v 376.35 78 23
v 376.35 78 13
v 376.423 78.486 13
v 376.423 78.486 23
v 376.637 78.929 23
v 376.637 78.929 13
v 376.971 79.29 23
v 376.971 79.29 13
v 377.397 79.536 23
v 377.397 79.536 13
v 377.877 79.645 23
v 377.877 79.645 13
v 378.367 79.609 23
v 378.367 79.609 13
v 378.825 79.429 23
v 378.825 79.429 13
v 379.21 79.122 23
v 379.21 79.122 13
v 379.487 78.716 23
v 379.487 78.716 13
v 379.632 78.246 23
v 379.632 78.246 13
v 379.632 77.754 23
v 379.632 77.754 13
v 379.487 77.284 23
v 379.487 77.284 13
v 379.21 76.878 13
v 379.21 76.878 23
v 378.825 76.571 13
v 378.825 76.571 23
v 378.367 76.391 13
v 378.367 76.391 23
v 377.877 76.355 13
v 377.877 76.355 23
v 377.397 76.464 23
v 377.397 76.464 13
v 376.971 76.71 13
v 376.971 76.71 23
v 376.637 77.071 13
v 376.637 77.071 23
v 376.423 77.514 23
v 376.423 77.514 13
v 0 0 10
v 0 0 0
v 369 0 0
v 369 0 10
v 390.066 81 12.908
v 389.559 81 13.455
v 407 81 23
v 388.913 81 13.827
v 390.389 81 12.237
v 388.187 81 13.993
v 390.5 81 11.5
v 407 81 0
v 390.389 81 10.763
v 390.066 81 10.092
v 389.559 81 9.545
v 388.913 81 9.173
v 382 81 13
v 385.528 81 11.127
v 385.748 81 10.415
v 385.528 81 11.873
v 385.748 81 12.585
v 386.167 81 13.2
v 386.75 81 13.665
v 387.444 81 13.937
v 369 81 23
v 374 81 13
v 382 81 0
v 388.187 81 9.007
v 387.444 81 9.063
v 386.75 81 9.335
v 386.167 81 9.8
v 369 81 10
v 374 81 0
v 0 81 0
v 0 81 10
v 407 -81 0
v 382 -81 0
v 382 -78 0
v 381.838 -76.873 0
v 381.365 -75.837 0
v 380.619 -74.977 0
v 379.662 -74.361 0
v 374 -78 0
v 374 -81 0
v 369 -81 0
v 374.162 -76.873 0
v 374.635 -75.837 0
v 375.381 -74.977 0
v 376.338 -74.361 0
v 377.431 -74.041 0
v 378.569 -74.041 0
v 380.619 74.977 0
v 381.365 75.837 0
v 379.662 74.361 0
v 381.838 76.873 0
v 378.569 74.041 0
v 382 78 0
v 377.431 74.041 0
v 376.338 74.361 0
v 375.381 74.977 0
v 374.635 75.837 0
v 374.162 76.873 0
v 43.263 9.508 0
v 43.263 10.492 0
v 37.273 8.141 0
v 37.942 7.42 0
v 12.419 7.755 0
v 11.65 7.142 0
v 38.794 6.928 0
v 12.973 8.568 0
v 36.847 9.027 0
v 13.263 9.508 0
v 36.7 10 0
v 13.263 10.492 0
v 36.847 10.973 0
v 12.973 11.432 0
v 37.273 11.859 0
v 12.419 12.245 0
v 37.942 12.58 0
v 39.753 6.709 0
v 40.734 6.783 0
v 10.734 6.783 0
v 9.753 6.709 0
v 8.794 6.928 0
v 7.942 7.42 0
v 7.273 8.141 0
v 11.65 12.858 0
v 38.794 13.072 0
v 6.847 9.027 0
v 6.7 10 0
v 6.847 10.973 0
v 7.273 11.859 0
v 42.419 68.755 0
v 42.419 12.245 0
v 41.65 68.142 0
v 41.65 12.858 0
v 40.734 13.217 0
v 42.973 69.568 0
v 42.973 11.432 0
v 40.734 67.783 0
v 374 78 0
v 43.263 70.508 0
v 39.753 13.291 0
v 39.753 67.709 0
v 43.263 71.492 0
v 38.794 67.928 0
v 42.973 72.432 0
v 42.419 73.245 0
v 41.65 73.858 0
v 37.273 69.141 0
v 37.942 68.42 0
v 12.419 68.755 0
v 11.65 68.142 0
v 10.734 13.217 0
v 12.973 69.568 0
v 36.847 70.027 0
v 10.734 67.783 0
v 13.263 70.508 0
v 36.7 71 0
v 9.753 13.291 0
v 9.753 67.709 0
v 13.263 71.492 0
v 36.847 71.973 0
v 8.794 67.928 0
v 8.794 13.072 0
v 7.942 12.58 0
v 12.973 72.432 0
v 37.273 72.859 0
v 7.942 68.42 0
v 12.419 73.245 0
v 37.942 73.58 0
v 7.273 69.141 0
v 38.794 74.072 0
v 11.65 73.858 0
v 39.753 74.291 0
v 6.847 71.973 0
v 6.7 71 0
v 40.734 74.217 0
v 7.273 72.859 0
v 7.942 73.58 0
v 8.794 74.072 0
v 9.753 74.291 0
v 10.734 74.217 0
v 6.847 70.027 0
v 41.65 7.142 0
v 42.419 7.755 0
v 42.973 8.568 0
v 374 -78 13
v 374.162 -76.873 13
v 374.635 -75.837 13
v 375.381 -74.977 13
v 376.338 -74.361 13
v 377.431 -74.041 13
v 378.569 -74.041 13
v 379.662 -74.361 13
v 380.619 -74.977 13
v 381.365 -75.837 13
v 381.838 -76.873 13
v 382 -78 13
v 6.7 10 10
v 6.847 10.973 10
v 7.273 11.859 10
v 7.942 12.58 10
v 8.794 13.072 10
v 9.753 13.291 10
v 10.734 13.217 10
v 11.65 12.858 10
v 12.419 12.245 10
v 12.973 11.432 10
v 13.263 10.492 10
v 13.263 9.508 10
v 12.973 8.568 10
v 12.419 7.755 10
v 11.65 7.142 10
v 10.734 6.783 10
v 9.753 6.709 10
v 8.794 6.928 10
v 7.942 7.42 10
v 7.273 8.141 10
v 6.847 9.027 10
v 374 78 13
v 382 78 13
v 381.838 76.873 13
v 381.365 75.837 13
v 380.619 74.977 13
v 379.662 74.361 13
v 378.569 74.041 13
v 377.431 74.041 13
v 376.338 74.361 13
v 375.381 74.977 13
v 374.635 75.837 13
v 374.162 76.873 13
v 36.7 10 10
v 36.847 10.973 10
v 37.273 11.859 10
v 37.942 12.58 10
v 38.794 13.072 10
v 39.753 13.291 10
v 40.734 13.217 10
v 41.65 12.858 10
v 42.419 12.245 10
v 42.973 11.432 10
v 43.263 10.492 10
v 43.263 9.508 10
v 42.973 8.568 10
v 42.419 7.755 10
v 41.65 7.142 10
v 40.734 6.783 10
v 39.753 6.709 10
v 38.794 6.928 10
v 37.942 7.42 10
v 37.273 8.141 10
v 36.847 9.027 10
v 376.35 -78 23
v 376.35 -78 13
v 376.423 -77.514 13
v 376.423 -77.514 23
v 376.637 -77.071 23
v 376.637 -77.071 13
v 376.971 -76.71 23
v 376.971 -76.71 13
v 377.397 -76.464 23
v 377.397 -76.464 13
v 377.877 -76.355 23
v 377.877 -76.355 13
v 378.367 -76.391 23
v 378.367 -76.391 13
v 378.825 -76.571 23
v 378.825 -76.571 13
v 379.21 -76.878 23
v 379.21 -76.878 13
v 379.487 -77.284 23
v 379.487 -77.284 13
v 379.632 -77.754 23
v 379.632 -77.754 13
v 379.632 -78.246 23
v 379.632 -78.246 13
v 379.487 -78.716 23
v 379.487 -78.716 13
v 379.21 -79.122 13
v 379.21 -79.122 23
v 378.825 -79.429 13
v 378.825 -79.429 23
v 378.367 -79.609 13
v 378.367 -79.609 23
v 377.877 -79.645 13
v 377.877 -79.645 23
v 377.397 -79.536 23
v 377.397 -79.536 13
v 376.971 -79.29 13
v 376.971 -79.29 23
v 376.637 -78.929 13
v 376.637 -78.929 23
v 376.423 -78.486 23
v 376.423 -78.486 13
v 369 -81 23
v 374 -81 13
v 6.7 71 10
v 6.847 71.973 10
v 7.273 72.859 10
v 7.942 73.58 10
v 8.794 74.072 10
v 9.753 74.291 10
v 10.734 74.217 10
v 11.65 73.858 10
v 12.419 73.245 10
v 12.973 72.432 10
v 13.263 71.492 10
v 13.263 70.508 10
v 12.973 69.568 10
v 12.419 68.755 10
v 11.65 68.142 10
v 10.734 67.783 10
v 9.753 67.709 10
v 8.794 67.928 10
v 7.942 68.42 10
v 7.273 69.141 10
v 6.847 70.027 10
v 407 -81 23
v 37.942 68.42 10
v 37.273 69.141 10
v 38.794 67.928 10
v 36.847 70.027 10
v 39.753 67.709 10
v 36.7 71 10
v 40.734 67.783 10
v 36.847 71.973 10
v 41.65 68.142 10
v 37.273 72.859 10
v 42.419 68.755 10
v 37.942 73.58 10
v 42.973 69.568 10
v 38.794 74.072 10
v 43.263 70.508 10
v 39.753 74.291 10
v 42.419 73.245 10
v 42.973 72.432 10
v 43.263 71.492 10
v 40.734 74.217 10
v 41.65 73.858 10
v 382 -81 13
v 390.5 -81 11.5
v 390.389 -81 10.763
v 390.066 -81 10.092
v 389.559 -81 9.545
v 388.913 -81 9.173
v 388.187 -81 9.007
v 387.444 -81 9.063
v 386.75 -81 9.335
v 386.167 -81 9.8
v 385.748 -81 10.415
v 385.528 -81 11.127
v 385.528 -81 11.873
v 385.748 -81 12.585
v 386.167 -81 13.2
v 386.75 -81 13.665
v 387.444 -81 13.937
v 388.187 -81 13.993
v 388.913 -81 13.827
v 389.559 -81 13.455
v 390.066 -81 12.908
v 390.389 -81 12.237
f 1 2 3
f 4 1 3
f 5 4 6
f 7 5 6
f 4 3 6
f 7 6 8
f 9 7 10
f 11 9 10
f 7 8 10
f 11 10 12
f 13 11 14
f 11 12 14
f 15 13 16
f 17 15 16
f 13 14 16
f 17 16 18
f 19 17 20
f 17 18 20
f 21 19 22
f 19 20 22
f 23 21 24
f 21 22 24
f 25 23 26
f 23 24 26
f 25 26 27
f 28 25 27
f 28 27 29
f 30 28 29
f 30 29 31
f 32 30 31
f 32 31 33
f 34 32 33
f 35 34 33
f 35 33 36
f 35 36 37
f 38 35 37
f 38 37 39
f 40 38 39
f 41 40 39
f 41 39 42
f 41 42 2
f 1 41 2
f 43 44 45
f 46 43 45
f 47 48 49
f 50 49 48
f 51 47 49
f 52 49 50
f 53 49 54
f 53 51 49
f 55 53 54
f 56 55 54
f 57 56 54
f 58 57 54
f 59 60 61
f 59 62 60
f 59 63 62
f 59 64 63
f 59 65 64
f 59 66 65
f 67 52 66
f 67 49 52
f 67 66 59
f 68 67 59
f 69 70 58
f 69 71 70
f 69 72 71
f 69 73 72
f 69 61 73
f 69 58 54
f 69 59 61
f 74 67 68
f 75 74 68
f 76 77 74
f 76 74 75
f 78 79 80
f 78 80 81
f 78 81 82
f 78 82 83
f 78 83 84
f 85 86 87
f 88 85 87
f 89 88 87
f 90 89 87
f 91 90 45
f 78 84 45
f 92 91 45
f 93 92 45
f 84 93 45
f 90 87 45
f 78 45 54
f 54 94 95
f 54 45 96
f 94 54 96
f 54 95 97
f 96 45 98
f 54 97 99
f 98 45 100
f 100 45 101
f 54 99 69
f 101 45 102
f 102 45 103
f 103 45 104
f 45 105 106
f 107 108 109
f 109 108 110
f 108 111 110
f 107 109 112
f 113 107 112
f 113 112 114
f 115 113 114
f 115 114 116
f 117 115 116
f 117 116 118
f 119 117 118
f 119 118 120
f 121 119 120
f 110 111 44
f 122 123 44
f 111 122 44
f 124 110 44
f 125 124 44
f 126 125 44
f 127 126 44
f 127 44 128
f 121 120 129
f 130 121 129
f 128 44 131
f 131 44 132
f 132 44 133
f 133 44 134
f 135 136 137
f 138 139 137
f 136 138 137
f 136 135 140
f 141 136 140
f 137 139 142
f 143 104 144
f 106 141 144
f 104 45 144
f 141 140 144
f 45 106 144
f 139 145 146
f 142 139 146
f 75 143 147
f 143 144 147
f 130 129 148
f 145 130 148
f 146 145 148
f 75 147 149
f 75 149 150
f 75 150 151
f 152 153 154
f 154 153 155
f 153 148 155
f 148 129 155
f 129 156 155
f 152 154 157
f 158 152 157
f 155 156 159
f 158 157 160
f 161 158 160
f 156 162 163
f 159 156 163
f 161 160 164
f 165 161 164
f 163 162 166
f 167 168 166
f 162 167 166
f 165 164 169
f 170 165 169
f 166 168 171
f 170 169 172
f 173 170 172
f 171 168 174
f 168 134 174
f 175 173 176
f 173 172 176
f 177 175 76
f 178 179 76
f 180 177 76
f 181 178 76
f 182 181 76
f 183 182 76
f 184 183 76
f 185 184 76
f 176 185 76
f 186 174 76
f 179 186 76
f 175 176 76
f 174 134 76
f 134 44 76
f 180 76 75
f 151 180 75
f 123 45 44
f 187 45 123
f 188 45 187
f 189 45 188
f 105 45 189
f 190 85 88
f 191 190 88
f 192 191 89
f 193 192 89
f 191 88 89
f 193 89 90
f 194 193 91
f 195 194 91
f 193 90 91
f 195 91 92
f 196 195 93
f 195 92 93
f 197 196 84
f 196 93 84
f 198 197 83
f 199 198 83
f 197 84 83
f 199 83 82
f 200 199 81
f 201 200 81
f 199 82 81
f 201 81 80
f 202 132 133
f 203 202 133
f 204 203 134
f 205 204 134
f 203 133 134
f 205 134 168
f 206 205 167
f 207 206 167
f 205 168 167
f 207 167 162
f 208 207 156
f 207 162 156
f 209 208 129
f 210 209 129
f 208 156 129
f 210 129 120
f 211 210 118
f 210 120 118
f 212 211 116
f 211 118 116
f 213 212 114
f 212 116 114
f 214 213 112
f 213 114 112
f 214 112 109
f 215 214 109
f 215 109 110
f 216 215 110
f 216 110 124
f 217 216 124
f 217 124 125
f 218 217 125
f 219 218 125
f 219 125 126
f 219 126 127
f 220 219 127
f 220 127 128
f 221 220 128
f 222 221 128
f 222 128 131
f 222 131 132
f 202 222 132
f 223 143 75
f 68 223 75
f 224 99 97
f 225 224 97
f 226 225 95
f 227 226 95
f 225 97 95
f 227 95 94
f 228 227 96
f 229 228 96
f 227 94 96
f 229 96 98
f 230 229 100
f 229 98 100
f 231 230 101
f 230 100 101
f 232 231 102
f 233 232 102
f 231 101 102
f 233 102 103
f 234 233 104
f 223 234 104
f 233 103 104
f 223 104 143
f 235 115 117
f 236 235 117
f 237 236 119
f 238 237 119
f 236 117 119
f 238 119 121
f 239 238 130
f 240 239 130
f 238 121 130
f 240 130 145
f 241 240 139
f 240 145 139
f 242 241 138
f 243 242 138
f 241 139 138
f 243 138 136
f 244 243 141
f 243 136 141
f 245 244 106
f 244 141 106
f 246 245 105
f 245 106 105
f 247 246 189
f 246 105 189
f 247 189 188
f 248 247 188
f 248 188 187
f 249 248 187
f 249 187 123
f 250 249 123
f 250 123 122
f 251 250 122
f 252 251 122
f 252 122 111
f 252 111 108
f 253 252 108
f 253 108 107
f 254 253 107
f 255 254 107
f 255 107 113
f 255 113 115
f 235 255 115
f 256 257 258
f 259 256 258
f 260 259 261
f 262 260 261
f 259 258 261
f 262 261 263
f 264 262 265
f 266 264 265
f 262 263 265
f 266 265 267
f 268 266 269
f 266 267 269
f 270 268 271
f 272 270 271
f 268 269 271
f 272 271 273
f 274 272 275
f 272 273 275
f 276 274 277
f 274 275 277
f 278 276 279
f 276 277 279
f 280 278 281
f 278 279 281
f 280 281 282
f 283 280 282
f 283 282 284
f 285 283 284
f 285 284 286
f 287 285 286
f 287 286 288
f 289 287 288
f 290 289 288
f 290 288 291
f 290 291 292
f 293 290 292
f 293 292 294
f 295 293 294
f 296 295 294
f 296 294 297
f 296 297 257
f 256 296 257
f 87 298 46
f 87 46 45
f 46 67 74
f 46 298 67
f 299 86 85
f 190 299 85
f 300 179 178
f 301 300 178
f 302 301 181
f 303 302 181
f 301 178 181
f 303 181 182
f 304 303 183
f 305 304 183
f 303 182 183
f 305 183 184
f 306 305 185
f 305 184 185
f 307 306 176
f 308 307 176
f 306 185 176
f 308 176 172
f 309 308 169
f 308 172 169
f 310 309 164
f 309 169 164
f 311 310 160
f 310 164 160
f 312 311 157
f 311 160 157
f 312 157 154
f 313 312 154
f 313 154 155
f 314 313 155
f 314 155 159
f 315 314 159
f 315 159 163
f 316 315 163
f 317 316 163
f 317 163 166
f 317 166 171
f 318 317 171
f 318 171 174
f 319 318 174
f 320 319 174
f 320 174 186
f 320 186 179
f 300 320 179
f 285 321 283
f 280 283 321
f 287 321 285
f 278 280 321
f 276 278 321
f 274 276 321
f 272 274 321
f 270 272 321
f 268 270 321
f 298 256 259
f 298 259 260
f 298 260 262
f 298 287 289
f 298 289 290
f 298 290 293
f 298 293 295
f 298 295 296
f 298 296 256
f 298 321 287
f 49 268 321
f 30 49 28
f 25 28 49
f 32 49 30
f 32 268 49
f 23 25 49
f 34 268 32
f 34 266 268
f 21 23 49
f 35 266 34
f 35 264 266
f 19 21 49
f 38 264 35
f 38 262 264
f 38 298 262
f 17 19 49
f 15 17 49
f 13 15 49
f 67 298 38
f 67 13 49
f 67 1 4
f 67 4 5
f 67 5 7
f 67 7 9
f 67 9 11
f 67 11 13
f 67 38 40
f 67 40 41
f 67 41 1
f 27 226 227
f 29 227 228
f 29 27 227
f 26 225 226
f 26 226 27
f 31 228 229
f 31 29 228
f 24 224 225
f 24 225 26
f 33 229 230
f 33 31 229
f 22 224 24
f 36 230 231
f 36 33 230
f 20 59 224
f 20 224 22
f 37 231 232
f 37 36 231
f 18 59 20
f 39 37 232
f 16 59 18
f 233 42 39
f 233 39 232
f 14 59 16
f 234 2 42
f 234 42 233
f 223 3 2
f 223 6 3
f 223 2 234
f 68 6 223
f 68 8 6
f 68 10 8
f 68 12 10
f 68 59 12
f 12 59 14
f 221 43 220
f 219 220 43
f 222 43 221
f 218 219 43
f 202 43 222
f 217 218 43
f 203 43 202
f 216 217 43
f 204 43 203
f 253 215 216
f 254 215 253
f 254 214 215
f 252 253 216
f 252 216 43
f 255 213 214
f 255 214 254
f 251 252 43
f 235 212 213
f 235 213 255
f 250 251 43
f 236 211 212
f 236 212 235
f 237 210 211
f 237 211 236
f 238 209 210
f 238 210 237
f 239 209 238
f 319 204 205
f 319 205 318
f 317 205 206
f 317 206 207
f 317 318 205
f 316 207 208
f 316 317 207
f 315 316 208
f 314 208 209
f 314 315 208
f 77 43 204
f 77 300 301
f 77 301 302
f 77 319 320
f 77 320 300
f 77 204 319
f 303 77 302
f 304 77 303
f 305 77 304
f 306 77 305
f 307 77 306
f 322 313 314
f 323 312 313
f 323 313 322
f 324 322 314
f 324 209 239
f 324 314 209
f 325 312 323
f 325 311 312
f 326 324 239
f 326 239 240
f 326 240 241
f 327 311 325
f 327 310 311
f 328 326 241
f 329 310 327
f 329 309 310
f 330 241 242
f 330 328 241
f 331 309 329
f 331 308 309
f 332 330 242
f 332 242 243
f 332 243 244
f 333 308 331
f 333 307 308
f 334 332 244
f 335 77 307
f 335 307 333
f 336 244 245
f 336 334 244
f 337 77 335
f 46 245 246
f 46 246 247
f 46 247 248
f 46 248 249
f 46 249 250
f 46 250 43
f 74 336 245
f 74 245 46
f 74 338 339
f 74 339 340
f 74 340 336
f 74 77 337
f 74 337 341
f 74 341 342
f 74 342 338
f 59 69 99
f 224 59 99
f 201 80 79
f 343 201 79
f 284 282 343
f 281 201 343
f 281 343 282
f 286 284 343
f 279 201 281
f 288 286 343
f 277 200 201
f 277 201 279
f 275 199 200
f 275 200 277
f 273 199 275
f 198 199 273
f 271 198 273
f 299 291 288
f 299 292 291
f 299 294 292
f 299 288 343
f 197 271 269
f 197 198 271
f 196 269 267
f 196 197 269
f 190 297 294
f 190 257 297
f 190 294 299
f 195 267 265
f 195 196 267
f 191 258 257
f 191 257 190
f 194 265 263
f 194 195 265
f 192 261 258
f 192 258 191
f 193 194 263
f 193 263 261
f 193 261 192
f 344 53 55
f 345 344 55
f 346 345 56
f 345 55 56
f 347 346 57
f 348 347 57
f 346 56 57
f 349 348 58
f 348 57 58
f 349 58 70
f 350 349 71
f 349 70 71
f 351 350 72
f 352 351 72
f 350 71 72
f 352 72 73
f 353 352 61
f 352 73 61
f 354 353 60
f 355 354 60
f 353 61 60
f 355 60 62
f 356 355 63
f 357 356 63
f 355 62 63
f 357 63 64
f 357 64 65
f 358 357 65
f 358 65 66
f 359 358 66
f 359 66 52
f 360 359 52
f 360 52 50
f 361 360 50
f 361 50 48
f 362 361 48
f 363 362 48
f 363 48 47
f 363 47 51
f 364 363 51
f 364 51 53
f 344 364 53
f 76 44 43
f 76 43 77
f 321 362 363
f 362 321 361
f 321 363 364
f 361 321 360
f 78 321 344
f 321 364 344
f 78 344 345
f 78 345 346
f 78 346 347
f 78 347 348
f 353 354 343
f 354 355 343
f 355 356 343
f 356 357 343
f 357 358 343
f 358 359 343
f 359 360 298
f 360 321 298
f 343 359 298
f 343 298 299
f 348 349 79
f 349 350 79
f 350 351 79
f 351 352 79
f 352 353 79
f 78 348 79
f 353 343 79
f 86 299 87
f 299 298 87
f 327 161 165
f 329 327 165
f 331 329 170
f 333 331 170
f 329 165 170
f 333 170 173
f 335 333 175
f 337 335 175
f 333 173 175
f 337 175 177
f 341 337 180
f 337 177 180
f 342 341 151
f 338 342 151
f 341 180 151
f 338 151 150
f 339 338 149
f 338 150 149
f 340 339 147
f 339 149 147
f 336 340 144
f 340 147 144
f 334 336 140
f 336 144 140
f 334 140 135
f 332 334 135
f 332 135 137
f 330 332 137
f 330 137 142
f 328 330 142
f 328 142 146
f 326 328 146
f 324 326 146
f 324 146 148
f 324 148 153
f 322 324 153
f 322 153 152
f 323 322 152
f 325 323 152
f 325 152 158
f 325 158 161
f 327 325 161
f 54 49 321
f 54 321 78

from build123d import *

# Parameters (mm, degrees)
SKETCH1_W           = 369
SKETCH1_H           = 81
BOSS_EXTRUDE1_DEPTH = 10
SKETCH2_W           = 23
SKETCH2_H           = 162
BOSS_EXTRUDE2_DEPTH = 38
SKETCH3_R           = 3.3
CUT_EXTRUDE1_DEPTH  = 13
SKETCH4_R           = 2.5
CUT_EXTRUDE2_DEPTH  = 163
SKETCH5_R           = 1.65
CUT_EXTRUDE3_DEPTH  = 24
CUT_EXTRUDE4_DEPTH  = 13


with BuildPart() as part:
    # Sketch1 → Boss-Extrude1 (new body)
    with BuildSketch(Plane.XY):
        with Locations((184.5, 40.5)):
            Rectangle(SKETCH1_W, SKETCH1_H)
    extrude(amount=BOSS_EXTRUDE1_DEPTH)

    # Sketch2 → Boss-Extrude2 (add)
    with BuildSketch(Plane(origin=(369, 0, 0), x_dir=(0, 0, -1), z_dir=(1, 0, 0))):
        with Locations((-11.5, 0)):
            Rectangle(SKETCH2_W, SKETCH2_H)
    extrude(amount=BOSS_EXTRUDE2_DEPTH)

    # Sketch3 → Cut-Extrude1 (cut)
    with BuildSketch(Plane(origin=(0, 0, 0), x_dir=(-1, 0, 0), z_dir=(0, 0, -1))):
        with Locations((-10, 71)):
            Circle(SKETCH3_R)
        with Locations((-10, 10)):
            Circle(SKETCH3_R)
        with Locations((-40, 10)):
            Circle(SKETCH3_R)
        with Locations((-40, 71)):
            Circle(SKETCH3_R)
    extrude(amount=-CUT_EXTRUDE1_DEPTH, mode=Mode.SUBTRACT)

    # Sketch4 → Cut-Extrude2 (cut, through all)
    with BuildSketch(Plane(origin=(0, 81, 0), x_dir=(1, 0, 0), z_dir=(0, 1, 0))):
        with Locations((388, -11.5)):
            Circle(SKETCH4_R)
    extrude(amount=-CUT_EXTRUDE2_DEPTH, mode=Mode.SUBTRACT)

    # Sketch5 → Cut-Extrude3 (cut, through all)
    with BuildSketch(Plane(origin=(0, 0, 0), x_dir=(-1, 0, 0), z_dir=(0, 0, -1))):
        with Locations((-378, -78)):
            Circle(SKETCH5_R)
        with Locations((-378, 78)):
            Circle(SKETCH5_R)
    extrude(amount=-CUT_EXTRUDE3_DEPTH, mode=Mode.SUBTRACT)

    # Sketch6 → Cut-Extrude4 (cut)
    with BuildSketch(Plane(origin=(0, 0, 0), x_dir=(-1, 0, 0), z_dir=(0, 0, -1))):
        with BuildLine():
            Line((-382, -78), (-382, -81))
            Line((-382, -81), (-374, -81))
            Line((-374, -81), (-374, -78))
            ThreePointArc((-374, -78), (-378, -74), (-382, -78))
        make_face()
        with BuildLine():
            Line((-374, 78), (-374, 81))
            Line((-374, 81), (-382, 81))
            Line((-382, 81), (-382, 78))
            ThreePointArc((-382, 78), (-378, 74), (-374, 78))
        make_face()
    extrude(amount=-CUT_EXTRUDE4_DEPTH, mode=Mode.SUBTRACT)


solid = part.part
